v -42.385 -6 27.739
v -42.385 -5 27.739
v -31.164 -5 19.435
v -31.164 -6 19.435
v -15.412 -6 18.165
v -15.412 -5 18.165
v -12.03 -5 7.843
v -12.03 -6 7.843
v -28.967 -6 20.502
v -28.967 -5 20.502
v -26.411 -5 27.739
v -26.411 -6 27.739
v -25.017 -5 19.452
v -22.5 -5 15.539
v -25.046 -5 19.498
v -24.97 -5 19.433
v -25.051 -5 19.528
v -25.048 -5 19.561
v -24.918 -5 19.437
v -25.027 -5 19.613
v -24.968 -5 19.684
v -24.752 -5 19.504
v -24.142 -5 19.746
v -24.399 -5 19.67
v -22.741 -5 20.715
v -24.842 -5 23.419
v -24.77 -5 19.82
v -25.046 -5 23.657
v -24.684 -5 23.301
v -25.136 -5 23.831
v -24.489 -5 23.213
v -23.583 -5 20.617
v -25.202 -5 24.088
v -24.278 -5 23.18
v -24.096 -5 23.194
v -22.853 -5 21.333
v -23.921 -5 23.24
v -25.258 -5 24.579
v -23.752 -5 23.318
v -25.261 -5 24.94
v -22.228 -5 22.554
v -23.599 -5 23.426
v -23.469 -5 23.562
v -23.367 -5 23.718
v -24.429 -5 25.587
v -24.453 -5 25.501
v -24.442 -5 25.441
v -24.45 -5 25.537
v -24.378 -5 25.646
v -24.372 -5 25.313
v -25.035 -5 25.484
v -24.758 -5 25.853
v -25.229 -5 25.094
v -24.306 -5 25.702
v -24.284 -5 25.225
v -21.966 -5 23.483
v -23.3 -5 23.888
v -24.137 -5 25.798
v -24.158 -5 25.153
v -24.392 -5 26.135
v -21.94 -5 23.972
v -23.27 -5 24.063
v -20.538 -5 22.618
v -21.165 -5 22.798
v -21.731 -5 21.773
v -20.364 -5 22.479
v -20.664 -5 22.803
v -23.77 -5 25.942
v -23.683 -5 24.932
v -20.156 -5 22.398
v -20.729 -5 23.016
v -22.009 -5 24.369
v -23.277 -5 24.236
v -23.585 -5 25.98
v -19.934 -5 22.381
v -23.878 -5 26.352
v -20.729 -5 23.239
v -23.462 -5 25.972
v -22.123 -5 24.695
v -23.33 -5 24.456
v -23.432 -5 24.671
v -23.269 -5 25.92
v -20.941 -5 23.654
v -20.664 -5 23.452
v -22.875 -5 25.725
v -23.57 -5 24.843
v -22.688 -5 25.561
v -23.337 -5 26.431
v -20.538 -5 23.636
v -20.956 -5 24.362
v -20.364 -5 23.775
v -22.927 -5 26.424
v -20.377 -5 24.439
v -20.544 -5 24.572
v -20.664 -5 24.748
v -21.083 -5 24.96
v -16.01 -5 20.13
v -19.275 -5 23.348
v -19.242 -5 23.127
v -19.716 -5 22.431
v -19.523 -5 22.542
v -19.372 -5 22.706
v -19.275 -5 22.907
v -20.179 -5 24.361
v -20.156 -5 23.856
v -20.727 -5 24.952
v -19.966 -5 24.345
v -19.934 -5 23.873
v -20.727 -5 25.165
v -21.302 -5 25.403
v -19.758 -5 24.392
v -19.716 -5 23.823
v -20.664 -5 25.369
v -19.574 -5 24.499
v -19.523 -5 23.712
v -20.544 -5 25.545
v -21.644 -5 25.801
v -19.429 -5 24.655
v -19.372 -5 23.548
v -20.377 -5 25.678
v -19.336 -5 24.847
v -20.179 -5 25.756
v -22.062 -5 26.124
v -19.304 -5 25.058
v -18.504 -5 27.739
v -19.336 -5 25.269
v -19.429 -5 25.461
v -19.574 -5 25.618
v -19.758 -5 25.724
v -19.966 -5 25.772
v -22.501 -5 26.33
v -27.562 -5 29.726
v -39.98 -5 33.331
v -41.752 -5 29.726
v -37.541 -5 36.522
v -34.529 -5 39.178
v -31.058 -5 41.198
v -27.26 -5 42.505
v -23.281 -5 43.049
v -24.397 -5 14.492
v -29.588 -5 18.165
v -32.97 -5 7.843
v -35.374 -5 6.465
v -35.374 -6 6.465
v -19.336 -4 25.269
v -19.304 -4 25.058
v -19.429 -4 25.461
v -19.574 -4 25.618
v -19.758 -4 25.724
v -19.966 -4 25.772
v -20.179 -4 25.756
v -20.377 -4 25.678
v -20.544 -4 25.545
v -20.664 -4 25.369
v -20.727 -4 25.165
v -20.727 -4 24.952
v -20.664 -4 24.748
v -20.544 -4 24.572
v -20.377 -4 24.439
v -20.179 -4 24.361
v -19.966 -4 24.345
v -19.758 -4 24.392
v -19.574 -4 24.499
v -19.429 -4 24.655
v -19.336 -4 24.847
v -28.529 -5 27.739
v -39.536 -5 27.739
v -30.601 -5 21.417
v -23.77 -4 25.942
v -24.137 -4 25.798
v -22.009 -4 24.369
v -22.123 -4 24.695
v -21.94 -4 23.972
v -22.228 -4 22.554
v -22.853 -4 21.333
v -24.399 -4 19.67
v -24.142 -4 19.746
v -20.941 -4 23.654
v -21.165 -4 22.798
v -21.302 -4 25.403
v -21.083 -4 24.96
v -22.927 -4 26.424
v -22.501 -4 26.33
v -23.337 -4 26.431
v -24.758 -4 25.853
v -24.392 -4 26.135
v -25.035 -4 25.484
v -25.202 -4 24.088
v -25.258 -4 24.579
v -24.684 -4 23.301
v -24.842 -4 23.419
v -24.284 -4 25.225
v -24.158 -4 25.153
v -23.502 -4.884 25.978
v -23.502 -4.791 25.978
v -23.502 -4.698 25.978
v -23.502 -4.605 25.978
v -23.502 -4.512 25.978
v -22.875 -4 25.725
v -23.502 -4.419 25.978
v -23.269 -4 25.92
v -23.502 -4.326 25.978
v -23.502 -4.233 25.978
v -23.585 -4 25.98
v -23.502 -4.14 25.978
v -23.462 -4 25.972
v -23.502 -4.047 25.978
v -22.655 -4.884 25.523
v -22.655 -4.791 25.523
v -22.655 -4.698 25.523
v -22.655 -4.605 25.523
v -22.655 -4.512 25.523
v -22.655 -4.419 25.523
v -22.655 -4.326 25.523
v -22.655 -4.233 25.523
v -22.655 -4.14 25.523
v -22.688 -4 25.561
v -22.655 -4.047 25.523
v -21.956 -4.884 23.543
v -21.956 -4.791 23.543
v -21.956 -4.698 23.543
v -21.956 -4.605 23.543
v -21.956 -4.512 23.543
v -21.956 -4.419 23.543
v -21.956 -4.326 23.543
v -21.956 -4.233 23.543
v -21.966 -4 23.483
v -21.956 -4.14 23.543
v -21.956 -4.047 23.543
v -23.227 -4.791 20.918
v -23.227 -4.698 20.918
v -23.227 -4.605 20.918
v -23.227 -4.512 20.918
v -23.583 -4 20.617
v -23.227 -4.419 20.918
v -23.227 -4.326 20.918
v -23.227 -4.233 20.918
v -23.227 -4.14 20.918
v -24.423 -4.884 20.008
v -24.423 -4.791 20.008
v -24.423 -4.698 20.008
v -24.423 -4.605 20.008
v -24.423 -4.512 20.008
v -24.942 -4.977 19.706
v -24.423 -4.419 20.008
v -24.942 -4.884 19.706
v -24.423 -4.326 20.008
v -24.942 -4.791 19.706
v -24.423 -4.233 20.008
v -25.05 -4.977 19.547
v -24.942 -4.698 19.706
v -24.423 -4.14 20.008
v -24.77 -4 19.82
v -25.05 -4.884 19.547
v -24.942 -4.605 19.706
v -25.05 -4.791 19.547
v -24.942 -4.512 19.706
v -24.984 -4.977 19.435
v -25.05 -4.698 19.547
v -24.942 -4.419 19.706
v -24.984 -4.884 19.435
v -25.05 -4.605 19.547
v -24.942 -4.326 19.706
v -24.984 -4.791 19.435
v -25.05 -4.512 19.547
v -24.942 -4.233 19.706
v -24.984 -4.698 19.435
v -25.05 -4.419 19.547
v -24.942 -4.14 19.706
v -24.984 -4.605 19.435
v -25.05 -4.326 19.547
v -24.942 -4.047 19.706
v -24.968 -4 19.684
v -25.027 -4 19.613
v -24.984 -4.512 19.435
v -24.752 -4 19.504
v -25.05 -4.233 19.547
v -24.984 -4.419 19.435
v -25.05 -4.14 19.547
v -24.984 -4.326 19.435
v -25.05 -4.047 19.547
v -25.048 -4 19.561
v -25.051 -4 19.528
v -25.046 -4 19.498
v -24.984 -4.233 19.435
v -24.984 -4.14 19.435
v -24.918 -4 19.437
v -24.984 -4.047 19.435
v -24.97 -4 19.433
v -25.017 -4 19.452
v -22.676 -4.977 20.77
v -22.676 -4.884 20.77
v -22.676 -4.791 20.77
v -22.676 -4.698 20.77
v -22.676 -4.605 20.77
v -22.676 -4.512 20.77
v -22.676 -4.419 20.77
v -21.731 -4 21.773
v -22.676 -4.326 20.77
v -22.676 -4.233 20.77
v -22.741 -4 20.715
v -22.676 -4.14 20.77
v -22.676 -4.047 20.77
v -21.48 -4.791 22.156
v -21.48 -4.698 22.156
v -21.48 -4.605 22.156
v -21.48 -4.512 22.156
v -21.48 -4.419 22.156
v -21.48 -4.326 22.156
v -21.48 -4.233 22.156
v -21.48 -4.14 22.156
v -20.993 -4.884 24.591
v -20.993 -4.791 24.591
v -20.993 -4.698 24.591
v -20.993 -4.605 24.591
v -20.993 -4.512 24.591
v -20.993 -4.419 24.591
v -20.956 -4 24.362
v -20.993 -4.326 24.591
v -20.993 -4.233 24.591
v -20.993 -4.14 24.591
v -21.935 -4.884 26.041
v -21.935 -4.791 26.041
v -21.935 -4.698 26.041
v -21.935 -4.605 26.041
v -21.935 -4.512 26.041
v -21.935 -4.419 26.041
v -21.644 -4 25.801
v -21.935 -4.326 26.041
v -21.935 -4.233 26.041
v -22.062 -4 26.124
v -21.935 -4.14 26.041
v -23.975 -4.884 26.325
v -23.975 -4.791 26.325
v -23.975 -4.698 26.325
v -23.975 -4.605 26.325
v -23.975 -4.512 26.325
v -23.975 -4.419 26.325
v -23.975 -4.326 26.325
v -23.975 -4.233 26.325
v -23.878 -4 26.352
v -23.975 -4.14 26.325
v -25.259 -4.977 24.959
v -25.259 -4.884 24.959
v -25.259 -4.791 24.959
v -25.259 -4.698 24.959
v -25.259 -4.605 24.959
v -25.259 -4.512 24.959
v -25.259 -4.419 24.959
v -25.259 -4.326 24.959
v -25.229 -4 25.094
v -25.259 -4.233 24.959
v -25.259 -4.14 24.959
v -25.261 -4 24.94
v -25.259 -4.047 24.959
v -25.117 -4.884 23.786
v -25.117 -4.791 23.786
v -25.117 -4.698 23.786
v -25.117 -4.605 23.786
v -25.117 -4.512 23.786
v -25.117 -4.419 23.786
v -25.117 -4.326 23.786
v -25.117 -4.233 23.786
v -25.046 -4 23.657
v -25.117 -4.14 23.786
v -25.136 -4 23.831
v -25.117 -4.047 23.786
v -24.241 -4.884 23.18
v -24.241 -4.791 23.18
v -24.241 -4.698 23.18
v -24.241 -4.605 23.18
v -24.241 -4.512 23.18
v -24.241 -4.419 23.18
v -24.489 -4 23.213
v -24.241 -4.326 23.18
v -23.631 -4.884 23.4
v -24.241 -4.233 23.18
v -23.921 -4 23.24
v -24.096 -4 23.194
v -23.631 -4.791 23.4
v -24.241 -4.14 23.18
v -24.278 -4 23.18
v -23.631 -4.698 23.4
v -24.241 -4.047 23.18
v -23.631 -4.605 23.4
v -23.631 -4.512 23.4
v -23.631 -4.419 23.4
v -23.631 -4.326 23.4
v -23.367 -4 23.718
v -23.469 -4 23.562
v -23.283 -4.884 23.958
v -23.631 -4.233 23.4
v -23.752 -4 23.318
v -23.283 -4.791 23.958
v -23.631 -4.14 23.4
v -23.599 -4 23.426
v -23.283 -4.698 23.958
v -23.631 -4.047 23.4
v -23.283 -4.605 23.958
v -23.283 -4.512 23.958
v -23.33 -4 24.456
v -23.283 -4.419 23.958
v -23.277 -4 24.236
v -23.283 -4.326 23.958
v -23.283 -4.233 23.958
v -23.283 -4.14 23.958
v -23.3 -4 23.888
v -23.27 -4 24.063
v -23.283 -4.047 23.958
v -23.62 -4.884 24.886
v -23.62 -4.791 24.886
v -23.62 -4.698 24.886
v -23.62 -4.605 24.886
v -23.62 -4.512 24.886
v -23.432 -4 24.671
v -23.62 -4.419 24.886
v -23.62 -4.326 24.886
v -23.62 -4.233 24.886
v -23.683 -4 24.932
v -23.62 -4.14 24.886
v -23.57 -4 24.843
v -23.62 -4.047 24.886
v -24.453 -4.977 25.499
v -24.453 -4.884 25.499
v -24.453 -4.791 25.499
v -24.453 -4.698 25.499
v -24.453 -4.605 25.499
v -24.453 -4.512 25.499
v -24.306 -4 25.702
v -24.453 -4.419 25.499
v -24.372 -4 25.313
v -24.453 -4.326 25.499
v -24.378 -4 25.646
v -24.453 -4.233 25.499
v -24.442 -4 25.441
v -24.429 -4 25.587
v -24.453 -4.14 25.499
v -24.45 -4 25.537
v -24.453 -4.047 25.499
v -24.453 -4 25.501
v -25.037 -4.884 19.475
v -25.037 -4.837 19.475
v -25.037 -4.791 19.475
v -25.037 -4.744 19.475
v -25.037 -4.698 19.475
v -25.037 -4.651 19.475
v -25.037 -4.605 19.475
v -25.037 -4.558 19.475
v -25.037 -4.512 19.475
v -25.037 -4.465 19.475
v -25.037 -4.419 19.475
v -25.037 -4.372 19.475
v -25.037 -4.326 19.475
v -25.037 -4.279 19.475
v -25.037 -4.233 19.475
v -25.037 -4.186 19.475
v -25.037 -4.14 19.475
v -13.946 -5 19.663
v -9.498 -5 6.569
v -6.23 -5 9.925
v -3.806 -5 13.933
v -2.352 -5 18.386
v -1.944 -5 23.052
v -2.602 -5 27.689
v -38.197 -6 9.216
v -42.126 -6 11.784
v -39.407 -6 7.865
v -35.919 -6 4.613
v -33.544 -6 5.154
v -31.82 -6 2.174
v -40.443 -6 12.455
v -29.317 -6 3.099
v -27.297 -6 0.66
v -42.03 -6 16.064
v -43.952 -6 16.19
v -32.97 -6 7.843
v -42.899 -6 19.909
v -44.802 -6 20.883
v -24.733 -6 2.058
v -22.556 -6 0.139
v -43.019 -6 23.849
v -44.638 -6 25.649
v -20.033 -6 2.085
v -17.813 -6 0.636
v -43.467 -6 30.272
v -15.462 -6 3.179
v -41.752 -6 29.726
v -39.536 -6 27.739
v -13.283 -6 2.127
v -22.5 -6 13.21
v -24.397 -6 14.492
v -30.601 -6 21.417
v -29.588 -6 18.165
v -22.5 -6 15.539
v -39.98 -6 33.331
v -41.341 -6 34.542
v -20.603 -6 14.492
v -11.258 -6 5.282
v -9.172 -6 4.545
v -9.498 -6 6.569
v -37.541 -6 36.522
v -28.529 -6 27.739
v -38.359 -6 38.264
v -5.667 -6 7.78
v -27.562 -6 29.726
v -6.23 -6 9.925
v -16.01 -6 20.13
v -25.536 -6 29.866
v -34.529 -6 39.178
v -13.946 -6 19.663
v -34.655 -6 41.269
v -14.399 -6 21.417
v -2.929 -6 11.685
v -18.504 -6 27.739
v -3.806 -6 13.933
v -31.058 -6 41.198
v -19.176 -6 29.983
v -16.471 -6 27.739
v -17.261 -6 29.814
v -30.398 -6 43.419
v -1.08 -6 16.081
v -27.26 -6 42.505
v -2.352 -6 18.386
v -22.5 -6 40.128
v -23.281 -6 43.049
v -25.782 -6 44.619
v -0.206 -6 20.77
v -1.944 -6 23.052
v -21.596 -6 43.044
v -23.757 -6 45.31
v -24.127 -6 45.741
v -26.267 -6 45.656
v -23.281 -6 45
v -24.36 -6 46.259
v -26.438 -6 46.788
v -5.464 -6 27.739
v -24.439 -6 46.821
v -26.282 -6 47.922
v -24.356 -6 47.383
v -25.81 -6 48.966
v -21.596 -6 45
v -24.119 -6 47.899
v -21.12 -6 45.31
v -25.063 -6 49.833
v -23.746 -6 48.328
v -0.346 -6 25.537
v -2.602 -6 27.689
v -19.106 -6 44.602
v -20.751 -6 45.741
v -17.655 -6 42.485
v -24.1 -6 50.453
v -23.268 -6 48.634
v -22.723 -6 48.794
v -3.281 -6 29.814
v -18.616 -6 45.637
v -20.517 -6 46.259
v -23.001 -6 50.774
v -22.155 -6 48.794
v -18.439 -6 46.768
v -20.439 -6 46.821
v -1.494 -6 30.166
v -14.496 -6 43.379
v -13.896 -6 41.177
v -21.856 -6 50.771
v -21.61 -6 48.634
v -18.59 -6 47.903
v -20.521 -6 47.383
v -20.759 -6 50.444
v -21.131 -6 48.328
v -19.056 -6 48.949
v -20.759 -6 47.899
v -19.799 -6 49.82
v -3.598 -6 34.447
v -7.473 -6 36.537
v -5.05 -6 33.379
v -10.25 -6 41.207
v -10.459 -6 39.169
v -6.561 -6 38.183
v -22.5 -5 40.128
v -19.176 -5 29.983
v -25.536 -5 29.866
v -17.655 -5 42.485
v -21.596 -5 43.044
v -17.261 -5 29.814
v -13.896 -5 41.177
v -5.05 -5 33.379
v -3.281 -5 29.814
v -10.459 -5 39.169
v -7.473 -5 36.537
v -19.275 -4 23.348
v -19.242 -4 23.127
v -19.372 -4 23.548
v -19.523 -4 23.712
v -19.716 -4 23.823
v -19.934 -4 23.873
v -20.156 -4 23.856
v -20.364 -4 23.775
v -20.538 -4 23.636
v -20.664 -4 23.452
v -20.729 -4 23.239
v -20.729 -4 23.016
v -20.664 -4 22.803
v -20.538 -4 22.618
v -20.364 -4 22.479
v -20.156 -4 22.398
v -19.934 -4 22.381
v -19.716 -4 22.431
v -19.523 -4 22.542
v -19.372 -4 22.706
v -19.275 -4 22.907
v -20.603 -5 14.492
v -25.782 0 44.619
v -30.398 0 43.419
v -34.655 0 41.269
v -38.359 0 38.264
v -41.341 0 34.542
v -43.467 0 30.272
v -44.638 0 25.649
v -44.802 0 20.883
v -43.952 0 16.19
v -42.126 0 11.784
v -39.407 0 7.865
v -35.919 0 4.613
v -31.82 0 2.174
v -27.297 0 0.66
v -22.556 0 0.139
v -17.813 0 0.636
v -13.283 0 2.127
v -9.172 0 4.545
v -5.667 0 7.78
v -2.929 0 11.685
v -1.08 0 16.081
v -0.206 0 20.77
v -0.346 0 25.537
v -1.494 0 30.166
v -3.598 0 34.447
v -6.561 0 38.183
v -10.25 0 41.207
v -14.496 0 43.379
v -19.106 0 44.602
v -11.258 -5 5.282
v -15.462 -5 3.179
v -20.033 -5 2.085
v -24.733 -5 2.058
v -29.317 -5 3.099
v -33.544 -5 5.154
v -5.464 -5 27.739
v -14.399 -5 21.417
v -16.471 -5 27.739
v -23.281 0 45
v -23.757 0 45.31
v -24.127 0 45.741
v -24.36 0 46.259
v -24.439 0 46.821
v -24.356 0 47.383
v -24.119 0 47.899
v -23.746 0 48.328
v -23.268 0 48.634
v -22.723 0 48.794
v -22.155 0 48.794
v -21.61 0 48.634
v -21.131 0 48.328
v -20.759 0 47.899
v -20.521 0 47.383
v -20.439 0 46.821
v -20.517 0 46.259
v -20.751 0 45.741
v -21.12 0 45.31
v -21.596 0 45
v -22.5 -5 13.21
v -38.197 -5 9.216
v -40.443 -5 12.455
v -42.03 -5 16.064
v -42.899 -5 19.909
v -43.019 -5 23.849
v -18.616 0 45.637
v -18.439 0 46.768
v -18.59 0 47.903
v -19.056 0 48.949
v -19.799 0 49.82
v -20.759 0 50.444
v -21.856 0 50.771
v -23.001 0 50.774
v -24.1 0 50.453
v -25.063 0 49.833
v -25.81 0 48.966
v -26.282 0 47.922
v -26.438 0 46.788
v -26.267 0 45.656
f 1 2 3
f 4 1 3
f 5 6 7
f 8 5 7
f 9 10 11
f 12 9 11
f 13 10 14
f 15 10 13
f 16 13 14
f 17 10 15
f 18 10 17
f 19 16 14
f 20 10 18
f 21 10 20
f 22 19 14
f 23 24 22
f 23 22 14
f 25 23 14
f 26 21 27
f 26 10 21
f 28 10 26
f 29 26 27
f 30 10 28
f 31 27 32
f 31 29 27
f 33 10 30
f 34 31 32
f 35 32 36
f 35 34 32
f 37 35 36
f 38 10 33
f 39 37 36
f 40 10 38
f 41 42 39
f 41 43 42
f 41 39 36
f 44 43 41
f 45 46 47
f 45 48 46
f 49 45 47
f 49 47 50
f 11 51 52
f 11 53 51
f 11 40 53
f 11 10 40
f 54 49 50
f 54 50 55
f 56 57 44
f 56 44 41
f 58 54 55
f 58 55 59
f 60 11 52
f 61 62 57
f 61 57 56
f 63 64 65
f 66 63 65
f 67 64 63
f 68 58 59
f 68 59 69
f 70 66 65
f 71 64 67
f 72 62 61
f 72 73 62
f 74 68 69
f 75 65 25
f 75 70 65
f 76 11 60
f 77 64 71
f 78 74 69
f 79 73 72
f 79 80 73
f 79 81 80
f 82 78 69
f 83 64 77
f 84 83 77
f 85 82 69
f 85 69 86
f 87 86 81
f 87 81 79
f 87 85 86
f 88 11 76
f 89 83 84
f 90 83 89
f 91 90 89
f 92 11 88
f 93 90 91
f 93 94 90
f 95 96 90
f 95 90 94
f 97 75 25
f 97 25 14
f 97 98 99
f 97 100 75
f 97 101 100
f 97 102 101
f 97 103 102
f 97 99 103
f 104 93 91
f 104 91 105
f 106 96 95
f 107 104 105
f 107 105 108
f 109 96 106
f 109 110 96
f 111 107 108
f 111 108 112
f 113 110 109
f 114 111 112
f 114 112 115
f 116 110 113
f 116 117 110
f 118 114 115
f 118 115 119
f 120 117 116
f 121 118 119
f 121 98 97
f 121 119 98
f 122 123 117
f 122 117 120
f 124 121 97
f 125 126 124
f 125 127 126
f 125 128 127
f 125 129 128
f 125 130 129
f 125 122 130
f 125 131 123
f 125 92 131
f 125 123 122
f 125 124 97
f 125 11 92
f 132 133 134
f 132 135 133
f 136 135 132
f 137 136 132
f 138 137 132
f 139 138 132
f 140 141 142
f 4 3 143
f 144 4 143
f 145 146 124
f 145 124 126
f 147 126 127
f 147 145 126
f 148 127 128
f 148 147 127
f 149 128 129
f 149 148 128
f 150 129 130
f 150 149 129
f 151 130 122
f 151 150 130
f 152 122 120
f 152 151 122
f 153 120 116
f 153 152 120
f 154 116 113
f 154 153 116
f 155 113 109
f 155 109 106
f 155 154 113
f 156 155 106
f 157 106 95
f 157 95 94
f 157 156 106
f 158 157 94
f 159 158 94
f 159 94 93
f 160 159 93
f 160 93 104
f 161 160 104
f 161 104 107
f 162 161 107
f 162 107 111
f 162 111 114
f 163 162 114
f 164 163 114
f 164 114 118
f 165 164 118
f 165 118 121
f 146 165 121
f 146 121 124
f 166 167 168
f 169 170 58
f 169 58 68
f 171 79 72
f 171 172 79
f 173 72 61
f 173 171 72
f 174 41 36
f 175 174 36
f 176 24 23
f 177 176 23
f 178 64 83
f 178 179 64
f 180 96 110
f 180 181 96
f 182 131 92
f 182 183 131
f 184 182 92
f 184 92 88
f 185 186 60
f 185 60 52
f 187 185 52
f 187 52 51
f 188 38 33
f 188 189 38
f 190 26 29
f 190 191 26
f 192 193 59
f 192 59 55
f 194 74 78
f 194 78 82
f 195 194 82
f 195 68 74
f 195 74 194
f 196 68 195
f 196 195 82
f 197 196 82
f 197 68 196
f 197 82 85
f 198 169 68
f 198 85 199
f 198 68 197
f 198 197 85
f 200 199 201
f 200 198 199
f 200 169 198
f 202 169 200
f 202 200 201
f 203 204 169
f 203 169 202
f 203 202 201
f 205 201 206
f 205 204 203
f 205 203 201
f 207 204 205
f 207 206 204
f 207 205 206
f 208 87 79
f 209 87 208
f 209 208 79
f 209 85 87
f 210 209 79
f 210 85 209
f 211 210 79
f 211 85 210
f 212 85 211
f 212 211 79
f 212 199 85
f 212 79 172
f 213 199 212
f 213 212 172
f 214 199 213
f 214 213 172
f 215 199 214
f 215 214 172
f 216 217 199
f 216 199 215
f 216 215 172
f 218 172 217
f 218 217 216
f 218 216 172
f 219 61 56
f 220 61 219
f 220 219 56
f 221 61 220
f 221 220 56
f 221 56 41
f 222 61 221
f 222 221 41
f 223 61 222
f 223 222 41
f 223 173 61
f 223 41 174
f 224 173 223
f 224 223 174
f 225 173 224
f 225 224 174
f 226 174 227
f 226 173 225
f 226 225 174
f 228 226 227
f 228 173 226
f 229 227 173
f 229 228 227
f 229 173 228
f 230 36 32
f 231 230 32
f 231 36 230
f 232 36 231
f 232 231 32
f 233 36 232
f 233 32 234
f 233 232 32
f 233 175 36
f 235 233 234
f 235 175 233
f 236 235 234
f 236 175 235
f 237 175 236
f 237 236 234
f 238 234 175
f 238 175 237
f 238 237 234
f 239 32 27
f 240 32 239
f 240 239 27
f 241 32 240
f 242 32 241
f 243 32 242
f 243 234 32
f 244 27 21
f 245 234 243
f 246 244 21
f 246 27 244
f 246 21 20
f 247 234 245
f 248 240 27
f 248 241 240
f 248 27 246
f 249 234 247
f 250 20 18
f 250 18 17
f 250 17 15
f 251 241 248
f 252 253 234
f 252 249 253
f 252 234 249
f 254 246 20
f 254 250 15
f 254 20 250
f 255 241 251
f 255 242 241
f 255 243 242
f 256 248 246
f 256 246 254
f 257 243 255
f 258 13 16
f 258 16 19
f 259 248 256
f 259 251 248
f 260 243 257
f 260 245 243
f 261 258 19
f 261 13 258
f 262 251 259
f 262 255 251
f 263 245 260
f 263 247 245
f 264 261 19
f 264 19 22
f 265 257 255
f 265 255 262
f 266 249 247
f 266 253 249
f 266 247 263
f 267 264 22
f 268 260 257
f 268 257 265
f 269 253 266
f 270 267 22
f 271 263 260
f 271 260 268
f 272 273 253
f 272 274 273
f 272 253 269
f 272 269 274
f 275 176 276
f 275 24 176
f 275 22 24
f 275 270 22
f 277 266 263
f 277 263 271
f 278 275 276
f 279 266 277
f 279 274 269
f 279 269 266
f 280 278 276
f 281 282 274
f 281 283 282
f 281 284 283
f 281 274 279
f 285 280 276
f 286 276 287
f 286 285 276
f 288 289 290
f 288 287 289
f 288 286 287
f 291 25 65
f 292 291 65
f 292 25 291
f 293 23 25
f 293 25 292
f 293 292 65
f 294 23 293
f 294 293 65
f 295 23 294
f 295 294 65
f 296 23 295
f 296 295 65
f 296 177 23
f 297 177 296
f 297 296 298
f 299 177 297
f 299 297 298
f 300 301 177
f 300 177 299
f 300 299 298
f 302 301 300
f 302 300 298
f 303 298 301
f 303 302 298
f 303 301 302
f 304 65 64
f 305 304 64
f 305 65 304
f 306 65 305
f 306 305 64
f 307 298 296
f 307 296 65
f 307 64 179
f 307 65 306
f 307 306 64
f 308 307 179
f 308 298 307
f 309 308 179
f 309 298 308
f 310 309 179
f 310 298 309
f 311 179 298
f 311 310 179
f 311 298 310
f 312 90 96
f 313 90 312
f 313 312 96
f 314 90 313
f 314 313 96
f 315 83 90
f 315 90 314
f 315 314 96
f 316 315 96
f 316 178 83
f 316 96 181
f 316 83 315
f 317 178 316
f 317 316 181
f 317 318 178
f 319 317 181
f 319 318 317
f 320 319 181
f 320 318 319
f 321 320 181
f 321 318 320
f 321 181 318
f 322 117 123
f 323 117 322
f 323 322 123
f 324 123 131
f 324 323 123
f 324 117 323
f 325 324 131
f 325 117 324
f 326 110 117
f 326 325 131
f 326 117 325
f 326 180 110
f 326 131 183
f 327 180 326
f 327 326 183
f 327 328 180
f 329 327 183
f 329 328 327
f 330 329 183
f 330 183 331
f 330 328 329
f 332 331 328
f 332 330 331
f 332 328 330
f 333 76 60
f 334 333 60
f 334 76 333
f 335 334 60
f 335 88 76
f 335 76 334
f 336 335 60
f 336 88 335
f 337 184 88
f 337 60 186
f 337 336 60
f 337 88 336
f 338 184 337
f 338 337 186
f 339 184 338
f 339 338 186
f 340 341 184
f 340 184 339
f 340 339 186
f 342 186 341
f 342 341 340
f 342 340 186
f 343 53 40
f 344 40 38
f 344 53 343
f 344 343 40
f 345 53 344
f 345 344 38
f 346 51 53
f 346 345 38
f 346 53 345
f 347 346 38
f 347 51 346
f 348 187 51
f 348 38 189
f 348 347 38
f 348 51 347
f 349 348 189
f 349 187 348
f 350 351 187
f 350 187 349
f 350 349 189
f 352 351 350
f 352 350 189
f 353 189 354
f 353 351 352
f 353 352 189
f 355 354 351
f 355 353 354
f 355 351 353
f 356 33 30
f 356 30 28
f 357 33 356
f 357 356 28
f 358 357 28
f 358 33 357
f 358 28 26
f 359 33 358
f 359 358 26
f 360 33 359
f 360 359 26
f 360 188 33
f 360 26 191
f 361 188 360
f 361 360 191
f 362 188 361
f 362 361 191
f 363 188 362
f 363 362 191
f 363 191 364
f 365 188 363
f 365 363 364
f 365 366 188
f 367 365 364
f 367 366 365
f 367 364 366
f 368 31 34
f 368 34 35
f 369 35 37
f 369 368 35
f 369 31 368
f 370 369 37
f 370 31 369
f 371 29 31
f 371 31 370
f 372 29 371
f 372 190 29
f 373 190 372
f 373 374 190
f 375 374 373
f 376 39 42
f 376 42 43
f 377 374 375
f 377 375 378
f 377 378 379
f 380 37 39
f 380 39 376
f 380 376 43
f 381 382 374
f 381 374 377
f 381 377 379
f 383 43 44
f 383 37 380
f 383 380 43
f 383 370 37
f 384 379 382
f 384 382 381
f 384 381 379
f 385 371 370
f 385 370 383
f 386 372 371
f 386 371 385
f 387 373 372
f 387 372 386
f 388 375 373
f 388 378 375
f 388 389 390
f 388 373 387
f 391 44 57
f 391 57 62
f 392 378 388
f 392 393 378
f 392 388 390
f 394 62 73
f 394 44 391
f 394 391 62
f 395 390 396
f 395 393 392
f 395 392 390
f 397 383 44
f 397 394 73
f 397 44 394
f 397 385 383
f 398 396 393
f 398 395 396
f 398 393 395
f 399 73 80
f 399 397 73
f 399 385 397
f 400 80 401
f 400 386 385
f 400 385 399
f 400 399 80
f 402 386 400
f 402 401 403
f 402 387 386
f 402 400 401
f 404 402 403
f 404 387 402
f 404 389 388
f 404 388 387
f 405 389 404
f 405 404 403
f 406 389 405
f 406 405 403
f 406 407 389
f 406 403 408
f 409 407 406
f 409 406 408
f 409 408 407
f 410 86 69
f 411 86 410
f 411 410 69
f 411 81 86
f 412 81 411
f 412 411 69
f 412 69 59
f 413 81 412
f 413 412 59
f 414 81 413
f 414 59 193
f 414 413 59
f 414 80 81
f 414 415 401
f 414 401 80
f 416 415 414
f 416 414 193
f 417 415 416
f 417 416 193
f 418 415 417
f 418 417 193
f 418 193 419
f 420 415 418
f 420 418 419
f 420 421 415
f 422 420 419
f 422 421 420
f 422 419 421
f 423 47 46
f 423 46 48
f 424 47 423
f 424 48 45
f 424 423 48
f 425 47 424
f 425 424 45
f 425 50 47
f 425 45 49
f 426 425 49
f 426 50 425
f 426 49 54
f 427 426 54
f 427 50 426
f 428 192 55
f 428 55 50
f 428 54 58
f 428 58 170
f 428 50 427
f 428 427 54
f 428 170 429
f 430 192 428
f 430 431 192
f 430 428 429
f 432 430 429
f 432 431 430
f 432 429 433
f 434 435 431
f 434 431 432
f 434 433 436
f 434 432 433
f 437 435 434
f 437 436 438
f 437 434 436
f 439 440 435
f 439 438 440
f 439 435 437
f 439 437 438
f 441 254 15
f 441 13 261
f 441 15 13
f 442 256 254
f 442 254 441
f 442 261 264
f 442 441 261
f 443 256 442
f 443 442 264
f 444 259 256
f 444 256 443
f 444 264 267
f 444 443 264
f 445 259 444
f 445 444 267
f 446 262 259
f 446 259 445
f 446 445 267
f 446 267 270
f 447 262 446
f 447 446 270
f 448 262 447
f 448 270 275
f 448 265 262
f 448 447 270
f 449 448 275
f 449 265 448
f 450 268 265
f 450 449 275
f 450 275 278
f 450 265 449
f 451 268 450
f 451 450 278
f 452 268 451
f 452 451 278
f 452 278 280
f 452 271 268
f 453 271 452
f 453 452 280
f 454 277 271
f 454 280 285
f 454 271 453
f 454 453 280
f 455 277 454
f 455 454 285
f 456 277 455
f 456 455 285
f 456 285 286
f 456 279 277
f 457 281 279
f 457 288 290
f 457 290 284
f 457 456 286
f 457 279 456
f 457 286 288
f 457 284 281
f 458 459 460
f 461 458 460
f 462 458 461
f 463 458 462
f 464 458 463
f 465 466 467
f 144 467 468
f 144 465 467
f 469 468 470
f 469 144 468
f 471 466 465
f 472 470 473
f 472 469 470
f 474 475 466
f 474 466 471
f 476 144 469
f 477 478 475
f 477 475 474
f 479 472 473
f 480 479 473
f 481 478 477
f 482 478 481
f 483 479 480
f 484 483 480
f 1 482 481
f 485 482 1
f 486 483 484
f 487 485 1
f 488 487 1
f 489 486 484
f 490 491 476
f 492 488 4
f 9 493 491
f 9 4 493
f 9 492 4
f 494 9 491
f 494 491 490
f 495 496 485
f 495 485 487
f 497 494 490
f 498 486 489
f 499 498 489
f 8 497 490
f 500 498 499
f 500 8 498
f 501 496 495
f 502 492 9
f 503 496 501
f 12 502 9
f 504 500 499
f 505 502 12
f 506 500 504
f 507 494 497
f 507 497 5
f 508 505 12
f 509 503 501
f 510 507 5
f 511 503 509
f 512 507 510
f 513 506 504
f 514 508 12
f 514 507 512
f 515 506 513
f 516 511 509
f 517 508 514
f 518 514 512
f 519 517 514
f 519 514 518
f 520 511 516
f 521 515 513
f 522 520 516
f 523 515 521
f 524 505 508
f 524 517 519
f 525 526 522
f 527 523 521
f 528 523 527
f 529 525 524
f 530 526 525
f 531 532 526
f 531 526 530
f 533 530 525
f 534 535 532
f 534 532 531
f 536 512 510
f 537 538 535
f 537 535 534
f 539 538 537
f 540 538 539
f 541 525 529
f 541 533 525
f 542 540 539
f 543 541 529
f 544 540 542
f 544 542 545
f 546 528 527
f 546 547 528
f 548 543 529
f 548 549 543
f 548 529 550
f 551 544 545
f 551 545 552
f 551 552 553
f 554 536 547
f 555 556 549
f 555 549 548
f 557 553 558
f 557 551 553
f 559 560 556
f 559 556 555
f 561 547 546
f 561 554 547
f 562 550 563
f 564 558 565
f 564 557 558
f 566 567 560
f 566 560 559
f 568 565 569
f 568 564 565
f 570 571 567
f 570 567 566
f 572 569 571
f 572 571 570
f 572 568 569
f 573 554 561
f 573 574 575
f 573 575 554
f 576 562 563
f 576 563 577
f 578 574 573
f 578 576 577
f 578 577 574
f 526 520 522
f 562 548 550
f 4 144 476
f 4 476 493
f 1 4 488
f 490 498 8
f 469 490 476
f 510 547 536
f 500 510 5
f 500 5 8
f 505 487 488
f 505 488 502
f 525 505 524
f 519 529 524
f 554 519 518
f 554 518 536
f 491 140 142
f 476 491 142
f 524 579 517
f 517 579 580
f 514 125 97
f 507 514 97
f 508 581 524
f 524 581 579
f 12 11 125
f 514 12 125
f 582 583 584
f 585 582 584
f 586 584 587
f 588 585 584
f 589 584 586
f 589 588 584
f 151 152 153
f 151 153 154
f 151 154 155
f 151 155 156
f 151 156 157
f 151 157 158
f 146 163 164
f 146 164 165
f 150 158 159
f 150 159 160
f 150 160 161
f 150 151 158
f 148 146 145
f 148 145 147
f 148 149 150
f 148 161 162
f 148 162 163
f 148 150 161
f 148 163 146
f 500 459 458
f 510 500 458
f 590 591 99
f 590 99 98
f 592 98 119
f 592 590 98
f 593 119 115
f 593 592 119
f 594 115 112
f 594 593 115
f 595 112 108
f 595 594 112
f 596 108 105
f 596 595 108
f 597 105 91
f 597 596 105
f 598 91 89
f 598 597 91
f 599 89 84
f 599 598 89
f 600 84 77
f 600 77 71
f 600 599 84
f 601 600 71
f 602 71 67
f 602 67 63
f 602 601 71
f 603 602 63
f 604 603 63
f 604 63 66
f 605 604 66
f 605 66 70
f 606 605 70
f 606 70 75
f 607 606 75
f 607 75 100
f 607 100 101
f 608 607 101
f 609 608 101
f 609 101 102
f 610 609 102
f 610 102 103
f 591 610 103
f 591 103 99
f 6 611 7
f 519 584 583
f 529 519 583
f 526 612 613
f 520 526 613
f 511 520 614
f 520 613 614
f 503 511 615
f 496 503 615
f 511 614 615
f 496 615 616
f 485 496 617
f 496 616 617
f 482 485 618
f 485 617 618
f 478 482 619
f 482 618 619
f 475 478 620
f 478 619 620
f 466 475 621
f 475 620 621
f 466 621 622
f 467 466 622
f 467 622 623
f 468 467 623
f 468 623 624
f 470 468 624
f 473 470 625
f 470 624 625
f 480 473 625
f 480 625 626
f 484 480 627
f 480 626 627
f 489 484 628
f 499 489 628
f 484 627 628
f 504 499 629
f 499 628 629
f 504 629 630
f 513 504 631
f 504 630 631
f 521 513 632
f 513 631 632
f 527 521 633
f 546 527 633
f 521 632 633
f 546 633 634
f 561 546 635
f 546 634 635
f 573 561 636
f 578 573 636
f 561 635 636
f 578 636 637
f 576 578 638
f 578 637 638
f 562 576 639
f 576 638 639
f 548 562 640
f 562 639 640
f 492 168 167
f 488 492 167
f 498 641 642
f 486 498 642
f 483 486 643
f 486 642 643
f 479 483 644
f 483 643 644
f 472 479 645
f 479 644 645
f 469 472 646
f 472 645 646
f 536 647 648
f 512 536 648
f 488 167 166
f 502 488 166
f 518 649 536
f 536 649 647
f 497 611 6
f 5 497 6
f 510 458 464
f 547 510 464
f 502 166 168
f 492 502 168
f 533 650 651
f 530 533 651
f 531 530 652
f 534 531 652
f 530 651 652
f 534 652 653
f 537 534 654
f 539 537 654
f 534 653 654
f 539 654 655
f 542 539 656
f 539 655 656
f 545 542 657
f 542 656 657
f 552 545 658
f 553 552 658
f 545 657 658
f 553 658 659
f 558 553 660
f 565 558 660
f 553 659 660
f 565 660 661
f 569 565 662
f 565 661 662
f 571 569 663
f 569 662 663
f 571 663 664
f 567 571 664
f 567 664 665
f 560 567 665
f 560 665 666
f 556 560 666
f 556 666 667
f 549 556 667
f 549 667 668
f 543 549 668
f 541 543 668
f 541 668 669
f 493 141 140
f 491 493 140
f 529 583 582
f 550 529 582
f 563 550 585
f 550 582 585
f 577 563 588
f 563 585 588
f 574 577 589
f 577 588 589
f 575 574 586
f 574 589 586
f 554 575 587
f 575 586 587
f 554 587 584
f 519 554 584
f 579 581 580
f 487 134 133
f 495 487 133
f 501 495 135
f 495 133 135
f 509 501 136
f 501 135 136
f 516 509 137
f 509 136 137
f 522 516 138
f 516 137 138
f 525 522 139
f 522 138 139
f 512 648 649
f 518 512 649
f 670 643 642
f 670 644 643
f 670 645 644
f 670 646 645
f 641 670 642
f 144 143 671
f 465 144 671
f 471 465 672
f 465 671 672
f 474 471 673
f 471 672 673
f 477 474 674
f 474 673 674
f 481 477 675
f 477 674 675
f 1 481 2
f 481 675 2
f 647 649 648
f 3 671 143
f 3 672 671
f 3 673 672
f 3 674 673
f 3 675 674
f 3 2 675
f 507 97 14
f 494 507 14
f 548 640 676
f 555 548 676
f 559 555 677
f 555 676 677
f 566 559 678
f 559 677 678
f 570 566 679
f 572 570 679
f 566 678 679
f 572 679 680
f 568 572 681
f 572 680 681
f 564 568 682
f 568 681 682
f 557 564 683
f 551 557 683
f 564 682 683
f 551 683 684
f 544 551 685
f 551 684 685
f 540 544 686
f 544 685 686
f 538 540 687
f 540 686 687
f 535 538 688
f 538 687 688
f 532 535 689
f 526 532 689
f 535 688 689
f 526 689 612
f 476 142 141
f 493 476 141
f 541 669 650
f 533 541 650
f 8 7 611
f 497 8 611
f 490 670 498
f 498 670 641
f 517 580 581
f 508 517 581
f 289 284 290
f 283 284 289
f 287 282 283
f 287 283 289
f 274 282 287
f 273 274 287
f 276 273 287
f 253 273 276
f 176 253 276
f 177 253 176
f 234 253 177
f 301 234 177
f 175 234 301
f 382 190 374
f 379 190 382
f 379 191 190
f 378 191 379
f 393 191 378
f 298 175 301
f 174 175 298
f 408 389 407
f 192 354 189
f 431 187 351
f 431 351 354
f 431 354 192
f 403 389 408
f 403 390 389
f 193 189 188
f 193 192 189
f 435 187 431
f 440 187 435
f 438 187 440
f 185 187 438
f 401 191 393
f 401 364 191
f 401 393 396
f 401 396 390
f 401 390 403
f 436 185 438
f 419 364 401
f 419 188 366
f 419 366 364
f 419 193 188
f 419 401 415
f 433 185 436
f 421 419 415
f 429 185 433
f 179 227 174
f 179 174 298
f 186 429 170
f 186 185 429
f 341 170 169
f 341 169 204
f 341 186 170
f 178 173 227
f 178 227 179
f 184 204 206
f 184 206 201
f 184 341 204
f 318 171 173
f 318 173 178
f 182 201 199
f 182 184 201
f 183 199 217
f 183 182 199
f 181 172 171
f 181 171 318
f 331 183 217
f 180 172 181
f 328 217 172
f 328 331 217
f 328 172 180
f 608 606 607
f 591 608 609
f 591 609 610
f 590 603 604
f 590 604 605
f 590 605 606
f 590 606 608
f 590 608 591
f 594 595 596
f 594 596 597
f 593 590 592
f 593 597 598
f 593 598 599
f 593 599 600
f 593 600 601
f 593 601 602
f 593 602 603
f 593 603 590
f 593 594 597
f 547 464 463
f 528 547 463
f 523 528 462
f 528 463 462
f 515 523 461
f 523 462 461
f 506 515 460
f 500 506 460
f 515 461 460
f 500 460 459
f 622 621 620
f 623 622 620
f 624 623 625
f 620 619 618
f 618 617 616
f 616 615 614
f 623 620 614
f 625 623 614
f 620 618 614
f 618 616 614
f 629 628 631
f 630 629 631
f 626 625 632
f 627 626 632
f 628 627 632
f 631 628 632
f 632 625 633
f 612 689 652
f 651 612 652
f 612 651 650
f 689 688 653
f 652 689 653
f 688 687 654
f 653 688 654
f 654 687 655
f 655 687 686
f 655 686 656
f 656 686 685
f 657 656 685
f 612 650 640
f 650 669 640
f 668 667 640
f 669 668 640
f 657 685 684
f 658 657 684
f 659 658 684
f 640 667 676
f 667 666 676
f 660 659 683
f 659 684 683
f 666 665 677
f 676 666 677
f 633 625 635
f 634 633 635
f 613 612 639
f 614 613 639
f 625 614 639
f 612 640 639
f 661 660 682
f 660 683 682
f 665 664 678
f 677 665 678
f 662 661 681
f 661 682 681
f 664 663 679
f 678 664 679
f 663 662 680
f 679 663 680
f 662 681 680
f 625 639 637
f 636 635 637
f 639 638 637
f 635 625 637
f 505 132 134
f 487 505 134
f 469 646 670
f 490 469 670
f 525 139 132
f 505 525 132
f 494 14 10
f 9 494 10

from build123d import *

# Parameters (mm, degrees)
F0_R     = 0.7479592016
F0_R_2   = 0.7154556478
F1_DEPTH = 5
F2_DEPTH = 6
F3_DEPTH = 4


with BuildPart() as f1:
    # F0 (on Front) → F1 (new body)
    with BuildSketch(Plane.XZ):
        with BuildLine():
            ThreePointArc((-19.1059168052, 44.601797374), (-22.4284686377, 50.813886651), (-25.7823659332, 44.6186645568))
            ThreePointArc((-25.7823659332, 44.6186645568), (-22.5564916994, 0.1391847961), (-19.1059168052, 44.601797374))
        make_face()
        with BuildLine():
            ThreePointArc((-35.3737242613, 6.4650089014), (-42.0302013856, 16.0637783035), (-42.3847366474, 27.7393667893))
            Line((-42.3847366474, 27.7393667893), (-31.1639953467, 19.4349084049))
            Line((-31.1639953467, 19.4349084049), (-35.3737242613, 6.4650089014))
        make_face(mode=Mode.SUBTRACT)
        Polygon((-39.5360679381, 27.7393667893), (-28.5291355848, 27.7393667893), (-30.6005839361, 21.4172078039), align=None, mode=Mode.SUBTRACT)
        Polygon((-29.5883324513, 18.1647339323), (-24.3974999338, 14.492043294), (-32.9701682877, 7.8432099579), align=None, mode=Mode.SUBTRACT)
        with BuildLine():
            ThreePointArc((-11.2579042464, 5.2817248554), (-22.3822039471, 1.9369301908), (-33.5440937819, 5.1540578687))
            Line((-33.5440937819, 5.1540578687), (-22.5, 13.2103506476))
            Line((-22.5, 13.2103506476), (-11.2579042464, 5.2817248554))
        make_face(mode=Mode.SUBTRACT)
        Polygon((-12.0298317123, 7.8432099579), (-20.6025000662, 14.492043294), (-15.4116675487, 18.1647339323), align=None, mode=Mode.SUBTRACT)
        Polygon((-16.0104798027, 20.1302143785), (-22.5, 15.5386580154), (-28.967153281, 20.5017030239), (-26.4105990855, 27.7393667893), (-18.5036101167, 27.7393667893), align=None, mode=Mode.SUBTRACT)
        with BuildLine():
            ThreePointArc((-2.6021278232, 27.6892580129), (-2.9520760141, 16.1178072945), (-9.4976208394, 6.5691540698))
            Line((-9.4976208394, 6.5691540698), (-13.9463264495, 19.6628514677))
            Line((-13.9463264495, 19.6628514677), (-2.6021278232, 27.6892580129))
        make_face(mode=Mode.SUBTRACT)
        Polygon((-14.3994160639, 21.4172078039), (-16.4708644152, 27.7393667893), (-5.4639320619, 27.7393667893), align=None, mode=Mode.SUBTRACT)
        with BuildLine():
            ThreePointArc((-41.7518326466, 29.7263860703), (-34.5291002687, 39.1779633833), (-23.2810519253, 43.0485686552))
            Line((-23.2810519253, 43.0485686552), (-27.5616962463, 29.7263860703))
            Line((-27.5616962463, 29.7263860703), (-41.7518326466, 29.7263860703))
        make_face(mode=Mode.SUBTRACT)
        Polygon((-19.1760000154, 29.9831019124), (-25.5359429866, 29.8663973808), (-22.5, 40.128108114), align=None, mode=Mode.SUBTRACT)
        with BuildLine():
            ThreePointArc((-21.596096248, 43.0435311934), (-10.4589160289, 39.1693135038), (-3.281187186, 29.8137507415))
            Line((-3.281187186, 29.8137507415), (-17.2613734154, 29.8137507415))
            Line((-17.2613734154, 29.8137507415), (-21.596096248, 43.0435311934))
        make_face(mode=Mode.SUBTRACT)
        with BuildLine():
            ThreePointArc((-23.2810519253, 45), (-22.4385740867, 48.813899416), (-21.596096248, 45))
            Line((-21.596096248, 45), (-23.2810519253, 45))
        make_face(mode=Mode.SUBTRACT)
        with BuildLine():
            Line((-27.5616962463, 29.7263860703), (-23.2810519253, 43.0485686552))
            ThreePointArc((-23.2810519253, 43.0485686552), (-34.5291002687, 39.1779633833), (-41.7518326466, 29.7263860703))
            Line((-41.7518326466, 29.7263860703), (-27.5616962463, 29.7263860703))
        make_face()
        with BuildLine():
            Line((-17.2613734154, 29.8137507415), (-3.281187186, 29.8137507415))
            ThreePointArc((-3.281187186, 29.8137507415), (-10.4589160289, 39.1693135038), (-21.596096248, 43.0435311934))
            Line((-21.596096248, 43.0435311934), (-17.2613734154, 29.8137507415))
        make_face()
        with BuildLine():
            Line((-13.9463264495, 19.6628514677), (-9.4976208394, 6.5691540698))
            ThreePointArc((-9.4976208394, 6.5691540698), (-2.9520760141, 16.1178072945), (-2.6021278232, 27.6892580129))
            Line((-2.6021278232, 27.6892580129), (-13.9463264495, 19.6628514677))
        make_face()
        with BuildLine():
            Line((-31.1639953467, 19.4349084049), (-42.3847366474, 27.7393667893))
            ThreePointArc((-42.3847366474, 27.7393667893), (-42.0302013856, 16.0637783035), (-35.3737242613, 6.4650089014))
            Line((-35.3737242613, 6.4650089014), (-31.1639953467, 19.4349084049))
        make_face()
        with BuildLine():
            Line((-22.5, 13.2103506476), (-33.5440937819, 5.1540578687))
            ThreePointArc((-33.5440937819, 5.1540578687), (-22.3822039471, 1.9369301908), (-11.2579042464, 5.2817248554))
            Line((-11.2579042464, 5.2817248554), (-22.5, 13.2103506476))
        make_face()
        Polygon((-28.967153281, 20.5017030239), (-22.5, 15.5386580154), (-16.0104798027, 20.1302143785), (-18.5036101167, 27.7393667893), (-26.4105990855, 27.7393667893), align=None)
        with BuildLine():
            add(Edge.make_bspline(
                [(-24.1368897259, 25.7977508008), (-24.0192526664, 25.8547602817), (-23.8206951319, 25.9246981149), (-23.4993709237, 26.035264187), (-22.9118502468, 25.7752706065), (-22.6454139435, 25.5452303422), (-22.2695101158, 24.9694677434), (-22.0277491804, 24.546582719), (-21.9130452886, 23.9094929922), (-21.9513966063, 23.5295958586), (-22.0803883734, 22.8741580146), (-22.6121756403, 21.5801117775), (-23.1940389074, 20.9128444702), (-23.7773781953, 20.4703212241), (-24.3564861124, 19.9975043004), (-25.1148150446, 19.6823758793), (-25.0057622775, 19.3161669868), (-24.46480957, 19.7003306914), (-24.1763038032, 19.6457608485), (-22.5233429796, 20.7864962244), (-21.4327424976, 22.0526293772), (-20.8511128391, 23.5323004136), (-20.970949499, 24.5869666942), (-21.1707513877, 25.3307861717), (-21.8953561674, 26.0982333692), (-22.6989218202, 26.4332313934), (-23.3527478288, 26.4477425249), (-23.9777412447, 26.3556629823), (-24.4377100211, 26.1233476831), (-24.7943158394, 25.854675352), (-25.1025725665, 25.3944840878), (-25.3094748751, 24.9669434146), (-25.22914595, 24.3460425378), (-25.1803259356, 23.7698675478), (-24.7525997744, 23.2849589824), (-24.2410315704, 23.1173649804), (-23.5831143232, 23.3328771925), (-23.2015674218, 23.9382897559), (-23.3224948624, 24.536914912), (-23.5908050552, 24.9136124499), (-23.9778820676, 25.0797645038), (-24.2789970507, 25.1952998813), (-24.411275591, 25.3540581553), (-24.5097889288, 25.5910854375), (-24.2621743389, 25.7370351491), (-24.1368897259, 25.7977508008)],
                knots=[0, 0, 0, 0, 0.0173962531, 0.0342740902, 0.0573082931, 0.0755347102, 0.0996042031, 0.1210693965, 0.1443872224, 0.1625076754, 0.186529852, 0.2218263186, 0.2499832154, 0.27485898, 0.3015437244, 0.3271293918, 0.3393392565, 0.3609389604, 0.3774540175, 0.4179104228, 0.4581642864, 0.4947647039, 0.5247635473, 0.5505216211, 0.580539966, 0.60808793, 0.6319530915, 0.6554250636, 0.6765417388, 0.6963148145, 0.7182156124, 0.7385178801, 0.7616697228, 0.7843150308, 0.8073555091, 0.828578249, 0.8524486773, 0.8766600199, 0.8991917039, 0.9190268914, 0.9381939111, 0.9548815349, 0.9682308397, 0.9814728212, 1, 1, 1, 1], degree=3))
        make_face(mode=Mode.SUBTRACT)
        with Locations((-19.9897103012, 23.1271144003)):
            Circle(F0_R, mode=Mode.SUBTRACT)
        with Locations((-20.0196485966, 25.0581968576)):
            Circle(F0_R_2, mode=Mode.SUBTRACT)
        Polygon((-5.4639320619, 27.7393667893), (-16.4708644152, 27.7393667893), (-14.3994160639, 21.4172078039), align=None)
        Polygon((-30.6005839361, 21.4172078039), (-28.5291355848, 27.7393667893), (-39.5360679381, 27.7393667893), align=None)
        Polygon((-32.9701682877, 7.8432099579), (-24.3974999338, 14.492043294), (-29.5883324513, 18.1647339323), align=None)
        Polygon((-15.4116675487, 18.1647339323), (-20.6025000662, 14.492043294), (-12.0298317123, 7.8432099579), align=None)
        Polygon((-22.5, 40.128108114), (-25.5359429866, 29.8663973808), (-19.1760000154, 29.9831019124), align=None)
    extrude(amount=F1_DEPTH)

    # F0 (on Front) → F2 (join)
    with BuildSketch(Plane.XZ):
        with BuildLine():
            ThreePointArc((-19.1059168052, 44.601797374), (-22.4284686377, 50.813886651), (-25.7823659332, 44.6186645568))
            ThreePointArc((-25.7823659332, 44.6186645568), (-22.5564916994, 0.1391847961), (-19.1059168052, 44.601797374))
        make_face()
        with BuildLine():
            ThreePointArc((-35.3737242613, 6.4650089014), (-42.0302013856, 16.0637783035), (-42.3847366474, 27.7393667893))
            Line((-42.3847366474, 27.7393667893), (-31.1639953467, 19.4349084049))
            Line((-31.1639953467, 19.4349084049), (-35.3737242613, 6.4650089014))
        make_face(mode=Mode.SUBTRACT)
        Polygon((-39.5360679381, 27.7393667893), (-28.5291355848, 27.7393667893), (-30.6005839361, 21.4172078039), align=None, mode=Mode.SUBTRACT)
        Polygon((-29.5883324513, 18.1647339323), (-24.3974999338, 14.492043294), (-32.9701682877, 7.8432099579), align=None, mode=Mode.SUBTRACT)
        with BuildLine():
            ThreePointArc((-11.2579042464, 5.2817248554), (-22.3822039471, 1.9369301908), (-33.5440937819, 5.1540578687))
            Line((-33.5440937819, 5.1540578687), (-22.5, 13.2103506476))
            Line((-22.5, 13.2103506476), (-11.2579042464, 5.2817248554))
        make_face(mode=Mode.SUBTRACT)
        Polygon((-12.0298317123, 7.8432099579), (-20.6025000662, 14.492043294), (-15.4116675487, 18.1647339323), align=None, mode=Mode.SUBTRACT)
        Polygon((-16.0104798027, 20.1302143785), (-22.5, 15.5386580154), (-28.967153281, 20.5017030239), (-26.4105990855, 27.7393667893), (-18.5036101167, 27.7393667893), align=None, mode=Mode.SUBTRACT)
        with BuildLine():
            ThreePointArc((-2.6021278232, 27.6892580129), (-2.9520760141, 16.1178072945), (-9.4976208394, 6.5691540698))
            Line((-9.4976208394, 6.5691540698), (-13.9463264495, 19.6628514677))
            Line((-13.9463264495, 19.6628514677), (-2.6021278232, 27.6892580129))
        make_face(mode=Mode.SUBTRACT)
        Polygon((-14.3994160639, 21.4172078039), (-16.4708644152, 27.7393667893), (-5.4639320619, 27.7393667893), align=None, mode=Mode.SUBTRACT)
        with BuildLine():
            ThreePointArc((-41.7518326466, 29.7263860703), (-34.5291002687, 39.1779633833), (-23.2810519253, 43.0485686552))
            Line((-23.2810519253, 43.0485686552), (-27.5616962463, 29.7263860703))
            Line((-27.5616962463, 29.7263860703), (-41.7518326466, 29.7263860703))
        make_face(mode=Mode.SUBTRACT)
        Polygon((-19.1760000154, 29.9831019124), (-25.5359429866, 29.8663973808), (-22.5, 40.128108114), align=None, mode=Mode.SUBTRACT)
        with BuildLine():
            ThreePointArc((-21.596096248, 43.0435311934), (-10.4589160289, 39.1693135038), (-3.281187186, 29.8137507415))
            Line((-3.281187186, 29.8137507415), (-17.2613734154, 29.8137507415))
            Line((-17.2613734154, 29.8137507415), (-21.596096248, 43.0435311934))
        make_face(mode=Mode.SUBTRACT)
        with BuildLine():
            ThreePointArc((-23.2810519253, 45), (-22.4385740867, 48.813899416), (-21.596096248, 45))
            Line((-21.596096248, 45), (-23.2810519253, 45))
        make_face(mode=Mode.SUBTRACT)
    extrude(amount=F2_DEPTH)

    # F0 (on Front) → F3 (join)
    with BuildSketch(Plane.XZ):
        with BuildLine():
            add(Edge.make_bspline(
                [(-24.1368897259, 25.7977508008), (-24.0192526664, 25.8547602817), (-23.8206951319, 25.9246981149), (-23.4993709237, 26.035264187), (-22.9118502468, 25.7752706065), (-22.6454139435, 25.5452303422), (-22.2695101158, 24.9694677434), (-22.0277491804, 24.546582719), (-21.9130452886, 23.9094929922), (-21.9513966063, 23.5295958586), (-22.0803883734, 22.8741580146), (-22.6121756403, 21.5801117775), (-23.1940389074, 20.9128444702), (-23.7773781953, 20.4703212241), (-24.3564861124, 19.9975043004), (-25.1148150446, 19.6823758793), (-25.0057622775, 19.3161669868), (-24.46480957, 19.7003306914), (-24.1763038032, 19.6457608485), (-22.5233429796, 20.7864962244), (-21.4327424976, 22.0526293772), (-20.8511128391, 23.5323004136), (-20.970949499, 24.5869666942), (-21.1707513877, 25.3307861717), (-21.8953561674, 26.0982333692), (-22.6989218202, 26.4332313934), (-23.3527478288, 26.4477425249), (-23.9777412447, 26.3556629823), (-24.4377100211, 26.1233476831), (-24.7943158394, 25.854675352), (-25.1025725665, 25.3944840878), (-25.3094748751, 24.9669434146), (-25.22914595, 24.3460425378), (-25.1803259356, 23.7698675478), (-24.7525997744, 23.2849589824), (-24.2410315704, 23.1173649804), (-23.5831143232, 23.3328771925), (-23.2015674218, 23.9382897559), (-23.3224948624, 24.536914912), (-23.5908050552, 24.9136124499), (-23.9778820676, 25.0797645038), (-24.2789970507, 25.1952998813), (-24.411275591, 25.3540581553), (-24.5097889288, 25.5910854375), (-24.2621743389, 25.7370351491), (-24.1368897259, 25.7977508008)],
                knots=[0, 0, 0, 0, 0.0173962531, 0.0342740902, 0.0573082931, 0.0755347102, 0.0996042031, 0.1210693965, 0.1443872224, 0.1625076754, 0.186529852, 0.2218263186, 0.2499832154, 0.27485898, 0.3015437244, 0.3271293918, 0.3393392565, 0.3609389604, 0.3774540175, 0.4179104228, 0.4581642864, 0.4947647039, 0.5247635473, 0.5505216211, 0.580539966, 0.60808793, 0.6319530915, 0.6554250636, 0.6765417388, 0.6963148145, 0.7182156124, 0.7385178801, 0.7616697228, 0.7843150308, 0.8073555091, 0.828578249, 0.8524486773, 0.8766600199, 0.8991917039, 0.9190268914, 0.9381939111, 0.9548815349, 0.9682308397, 0.9814728212, 1, 1, 1, 1], degree=3))
        make_face()
        with Locations((-20.0196485966, 25.0581968576)):
            Circle(F0_R_2)
        with Locations((-19.9897103012, 23.1271144003)):
            Circle(F0_R)
    extrude(amount=F3_DEPTH)


solid = f1.part
